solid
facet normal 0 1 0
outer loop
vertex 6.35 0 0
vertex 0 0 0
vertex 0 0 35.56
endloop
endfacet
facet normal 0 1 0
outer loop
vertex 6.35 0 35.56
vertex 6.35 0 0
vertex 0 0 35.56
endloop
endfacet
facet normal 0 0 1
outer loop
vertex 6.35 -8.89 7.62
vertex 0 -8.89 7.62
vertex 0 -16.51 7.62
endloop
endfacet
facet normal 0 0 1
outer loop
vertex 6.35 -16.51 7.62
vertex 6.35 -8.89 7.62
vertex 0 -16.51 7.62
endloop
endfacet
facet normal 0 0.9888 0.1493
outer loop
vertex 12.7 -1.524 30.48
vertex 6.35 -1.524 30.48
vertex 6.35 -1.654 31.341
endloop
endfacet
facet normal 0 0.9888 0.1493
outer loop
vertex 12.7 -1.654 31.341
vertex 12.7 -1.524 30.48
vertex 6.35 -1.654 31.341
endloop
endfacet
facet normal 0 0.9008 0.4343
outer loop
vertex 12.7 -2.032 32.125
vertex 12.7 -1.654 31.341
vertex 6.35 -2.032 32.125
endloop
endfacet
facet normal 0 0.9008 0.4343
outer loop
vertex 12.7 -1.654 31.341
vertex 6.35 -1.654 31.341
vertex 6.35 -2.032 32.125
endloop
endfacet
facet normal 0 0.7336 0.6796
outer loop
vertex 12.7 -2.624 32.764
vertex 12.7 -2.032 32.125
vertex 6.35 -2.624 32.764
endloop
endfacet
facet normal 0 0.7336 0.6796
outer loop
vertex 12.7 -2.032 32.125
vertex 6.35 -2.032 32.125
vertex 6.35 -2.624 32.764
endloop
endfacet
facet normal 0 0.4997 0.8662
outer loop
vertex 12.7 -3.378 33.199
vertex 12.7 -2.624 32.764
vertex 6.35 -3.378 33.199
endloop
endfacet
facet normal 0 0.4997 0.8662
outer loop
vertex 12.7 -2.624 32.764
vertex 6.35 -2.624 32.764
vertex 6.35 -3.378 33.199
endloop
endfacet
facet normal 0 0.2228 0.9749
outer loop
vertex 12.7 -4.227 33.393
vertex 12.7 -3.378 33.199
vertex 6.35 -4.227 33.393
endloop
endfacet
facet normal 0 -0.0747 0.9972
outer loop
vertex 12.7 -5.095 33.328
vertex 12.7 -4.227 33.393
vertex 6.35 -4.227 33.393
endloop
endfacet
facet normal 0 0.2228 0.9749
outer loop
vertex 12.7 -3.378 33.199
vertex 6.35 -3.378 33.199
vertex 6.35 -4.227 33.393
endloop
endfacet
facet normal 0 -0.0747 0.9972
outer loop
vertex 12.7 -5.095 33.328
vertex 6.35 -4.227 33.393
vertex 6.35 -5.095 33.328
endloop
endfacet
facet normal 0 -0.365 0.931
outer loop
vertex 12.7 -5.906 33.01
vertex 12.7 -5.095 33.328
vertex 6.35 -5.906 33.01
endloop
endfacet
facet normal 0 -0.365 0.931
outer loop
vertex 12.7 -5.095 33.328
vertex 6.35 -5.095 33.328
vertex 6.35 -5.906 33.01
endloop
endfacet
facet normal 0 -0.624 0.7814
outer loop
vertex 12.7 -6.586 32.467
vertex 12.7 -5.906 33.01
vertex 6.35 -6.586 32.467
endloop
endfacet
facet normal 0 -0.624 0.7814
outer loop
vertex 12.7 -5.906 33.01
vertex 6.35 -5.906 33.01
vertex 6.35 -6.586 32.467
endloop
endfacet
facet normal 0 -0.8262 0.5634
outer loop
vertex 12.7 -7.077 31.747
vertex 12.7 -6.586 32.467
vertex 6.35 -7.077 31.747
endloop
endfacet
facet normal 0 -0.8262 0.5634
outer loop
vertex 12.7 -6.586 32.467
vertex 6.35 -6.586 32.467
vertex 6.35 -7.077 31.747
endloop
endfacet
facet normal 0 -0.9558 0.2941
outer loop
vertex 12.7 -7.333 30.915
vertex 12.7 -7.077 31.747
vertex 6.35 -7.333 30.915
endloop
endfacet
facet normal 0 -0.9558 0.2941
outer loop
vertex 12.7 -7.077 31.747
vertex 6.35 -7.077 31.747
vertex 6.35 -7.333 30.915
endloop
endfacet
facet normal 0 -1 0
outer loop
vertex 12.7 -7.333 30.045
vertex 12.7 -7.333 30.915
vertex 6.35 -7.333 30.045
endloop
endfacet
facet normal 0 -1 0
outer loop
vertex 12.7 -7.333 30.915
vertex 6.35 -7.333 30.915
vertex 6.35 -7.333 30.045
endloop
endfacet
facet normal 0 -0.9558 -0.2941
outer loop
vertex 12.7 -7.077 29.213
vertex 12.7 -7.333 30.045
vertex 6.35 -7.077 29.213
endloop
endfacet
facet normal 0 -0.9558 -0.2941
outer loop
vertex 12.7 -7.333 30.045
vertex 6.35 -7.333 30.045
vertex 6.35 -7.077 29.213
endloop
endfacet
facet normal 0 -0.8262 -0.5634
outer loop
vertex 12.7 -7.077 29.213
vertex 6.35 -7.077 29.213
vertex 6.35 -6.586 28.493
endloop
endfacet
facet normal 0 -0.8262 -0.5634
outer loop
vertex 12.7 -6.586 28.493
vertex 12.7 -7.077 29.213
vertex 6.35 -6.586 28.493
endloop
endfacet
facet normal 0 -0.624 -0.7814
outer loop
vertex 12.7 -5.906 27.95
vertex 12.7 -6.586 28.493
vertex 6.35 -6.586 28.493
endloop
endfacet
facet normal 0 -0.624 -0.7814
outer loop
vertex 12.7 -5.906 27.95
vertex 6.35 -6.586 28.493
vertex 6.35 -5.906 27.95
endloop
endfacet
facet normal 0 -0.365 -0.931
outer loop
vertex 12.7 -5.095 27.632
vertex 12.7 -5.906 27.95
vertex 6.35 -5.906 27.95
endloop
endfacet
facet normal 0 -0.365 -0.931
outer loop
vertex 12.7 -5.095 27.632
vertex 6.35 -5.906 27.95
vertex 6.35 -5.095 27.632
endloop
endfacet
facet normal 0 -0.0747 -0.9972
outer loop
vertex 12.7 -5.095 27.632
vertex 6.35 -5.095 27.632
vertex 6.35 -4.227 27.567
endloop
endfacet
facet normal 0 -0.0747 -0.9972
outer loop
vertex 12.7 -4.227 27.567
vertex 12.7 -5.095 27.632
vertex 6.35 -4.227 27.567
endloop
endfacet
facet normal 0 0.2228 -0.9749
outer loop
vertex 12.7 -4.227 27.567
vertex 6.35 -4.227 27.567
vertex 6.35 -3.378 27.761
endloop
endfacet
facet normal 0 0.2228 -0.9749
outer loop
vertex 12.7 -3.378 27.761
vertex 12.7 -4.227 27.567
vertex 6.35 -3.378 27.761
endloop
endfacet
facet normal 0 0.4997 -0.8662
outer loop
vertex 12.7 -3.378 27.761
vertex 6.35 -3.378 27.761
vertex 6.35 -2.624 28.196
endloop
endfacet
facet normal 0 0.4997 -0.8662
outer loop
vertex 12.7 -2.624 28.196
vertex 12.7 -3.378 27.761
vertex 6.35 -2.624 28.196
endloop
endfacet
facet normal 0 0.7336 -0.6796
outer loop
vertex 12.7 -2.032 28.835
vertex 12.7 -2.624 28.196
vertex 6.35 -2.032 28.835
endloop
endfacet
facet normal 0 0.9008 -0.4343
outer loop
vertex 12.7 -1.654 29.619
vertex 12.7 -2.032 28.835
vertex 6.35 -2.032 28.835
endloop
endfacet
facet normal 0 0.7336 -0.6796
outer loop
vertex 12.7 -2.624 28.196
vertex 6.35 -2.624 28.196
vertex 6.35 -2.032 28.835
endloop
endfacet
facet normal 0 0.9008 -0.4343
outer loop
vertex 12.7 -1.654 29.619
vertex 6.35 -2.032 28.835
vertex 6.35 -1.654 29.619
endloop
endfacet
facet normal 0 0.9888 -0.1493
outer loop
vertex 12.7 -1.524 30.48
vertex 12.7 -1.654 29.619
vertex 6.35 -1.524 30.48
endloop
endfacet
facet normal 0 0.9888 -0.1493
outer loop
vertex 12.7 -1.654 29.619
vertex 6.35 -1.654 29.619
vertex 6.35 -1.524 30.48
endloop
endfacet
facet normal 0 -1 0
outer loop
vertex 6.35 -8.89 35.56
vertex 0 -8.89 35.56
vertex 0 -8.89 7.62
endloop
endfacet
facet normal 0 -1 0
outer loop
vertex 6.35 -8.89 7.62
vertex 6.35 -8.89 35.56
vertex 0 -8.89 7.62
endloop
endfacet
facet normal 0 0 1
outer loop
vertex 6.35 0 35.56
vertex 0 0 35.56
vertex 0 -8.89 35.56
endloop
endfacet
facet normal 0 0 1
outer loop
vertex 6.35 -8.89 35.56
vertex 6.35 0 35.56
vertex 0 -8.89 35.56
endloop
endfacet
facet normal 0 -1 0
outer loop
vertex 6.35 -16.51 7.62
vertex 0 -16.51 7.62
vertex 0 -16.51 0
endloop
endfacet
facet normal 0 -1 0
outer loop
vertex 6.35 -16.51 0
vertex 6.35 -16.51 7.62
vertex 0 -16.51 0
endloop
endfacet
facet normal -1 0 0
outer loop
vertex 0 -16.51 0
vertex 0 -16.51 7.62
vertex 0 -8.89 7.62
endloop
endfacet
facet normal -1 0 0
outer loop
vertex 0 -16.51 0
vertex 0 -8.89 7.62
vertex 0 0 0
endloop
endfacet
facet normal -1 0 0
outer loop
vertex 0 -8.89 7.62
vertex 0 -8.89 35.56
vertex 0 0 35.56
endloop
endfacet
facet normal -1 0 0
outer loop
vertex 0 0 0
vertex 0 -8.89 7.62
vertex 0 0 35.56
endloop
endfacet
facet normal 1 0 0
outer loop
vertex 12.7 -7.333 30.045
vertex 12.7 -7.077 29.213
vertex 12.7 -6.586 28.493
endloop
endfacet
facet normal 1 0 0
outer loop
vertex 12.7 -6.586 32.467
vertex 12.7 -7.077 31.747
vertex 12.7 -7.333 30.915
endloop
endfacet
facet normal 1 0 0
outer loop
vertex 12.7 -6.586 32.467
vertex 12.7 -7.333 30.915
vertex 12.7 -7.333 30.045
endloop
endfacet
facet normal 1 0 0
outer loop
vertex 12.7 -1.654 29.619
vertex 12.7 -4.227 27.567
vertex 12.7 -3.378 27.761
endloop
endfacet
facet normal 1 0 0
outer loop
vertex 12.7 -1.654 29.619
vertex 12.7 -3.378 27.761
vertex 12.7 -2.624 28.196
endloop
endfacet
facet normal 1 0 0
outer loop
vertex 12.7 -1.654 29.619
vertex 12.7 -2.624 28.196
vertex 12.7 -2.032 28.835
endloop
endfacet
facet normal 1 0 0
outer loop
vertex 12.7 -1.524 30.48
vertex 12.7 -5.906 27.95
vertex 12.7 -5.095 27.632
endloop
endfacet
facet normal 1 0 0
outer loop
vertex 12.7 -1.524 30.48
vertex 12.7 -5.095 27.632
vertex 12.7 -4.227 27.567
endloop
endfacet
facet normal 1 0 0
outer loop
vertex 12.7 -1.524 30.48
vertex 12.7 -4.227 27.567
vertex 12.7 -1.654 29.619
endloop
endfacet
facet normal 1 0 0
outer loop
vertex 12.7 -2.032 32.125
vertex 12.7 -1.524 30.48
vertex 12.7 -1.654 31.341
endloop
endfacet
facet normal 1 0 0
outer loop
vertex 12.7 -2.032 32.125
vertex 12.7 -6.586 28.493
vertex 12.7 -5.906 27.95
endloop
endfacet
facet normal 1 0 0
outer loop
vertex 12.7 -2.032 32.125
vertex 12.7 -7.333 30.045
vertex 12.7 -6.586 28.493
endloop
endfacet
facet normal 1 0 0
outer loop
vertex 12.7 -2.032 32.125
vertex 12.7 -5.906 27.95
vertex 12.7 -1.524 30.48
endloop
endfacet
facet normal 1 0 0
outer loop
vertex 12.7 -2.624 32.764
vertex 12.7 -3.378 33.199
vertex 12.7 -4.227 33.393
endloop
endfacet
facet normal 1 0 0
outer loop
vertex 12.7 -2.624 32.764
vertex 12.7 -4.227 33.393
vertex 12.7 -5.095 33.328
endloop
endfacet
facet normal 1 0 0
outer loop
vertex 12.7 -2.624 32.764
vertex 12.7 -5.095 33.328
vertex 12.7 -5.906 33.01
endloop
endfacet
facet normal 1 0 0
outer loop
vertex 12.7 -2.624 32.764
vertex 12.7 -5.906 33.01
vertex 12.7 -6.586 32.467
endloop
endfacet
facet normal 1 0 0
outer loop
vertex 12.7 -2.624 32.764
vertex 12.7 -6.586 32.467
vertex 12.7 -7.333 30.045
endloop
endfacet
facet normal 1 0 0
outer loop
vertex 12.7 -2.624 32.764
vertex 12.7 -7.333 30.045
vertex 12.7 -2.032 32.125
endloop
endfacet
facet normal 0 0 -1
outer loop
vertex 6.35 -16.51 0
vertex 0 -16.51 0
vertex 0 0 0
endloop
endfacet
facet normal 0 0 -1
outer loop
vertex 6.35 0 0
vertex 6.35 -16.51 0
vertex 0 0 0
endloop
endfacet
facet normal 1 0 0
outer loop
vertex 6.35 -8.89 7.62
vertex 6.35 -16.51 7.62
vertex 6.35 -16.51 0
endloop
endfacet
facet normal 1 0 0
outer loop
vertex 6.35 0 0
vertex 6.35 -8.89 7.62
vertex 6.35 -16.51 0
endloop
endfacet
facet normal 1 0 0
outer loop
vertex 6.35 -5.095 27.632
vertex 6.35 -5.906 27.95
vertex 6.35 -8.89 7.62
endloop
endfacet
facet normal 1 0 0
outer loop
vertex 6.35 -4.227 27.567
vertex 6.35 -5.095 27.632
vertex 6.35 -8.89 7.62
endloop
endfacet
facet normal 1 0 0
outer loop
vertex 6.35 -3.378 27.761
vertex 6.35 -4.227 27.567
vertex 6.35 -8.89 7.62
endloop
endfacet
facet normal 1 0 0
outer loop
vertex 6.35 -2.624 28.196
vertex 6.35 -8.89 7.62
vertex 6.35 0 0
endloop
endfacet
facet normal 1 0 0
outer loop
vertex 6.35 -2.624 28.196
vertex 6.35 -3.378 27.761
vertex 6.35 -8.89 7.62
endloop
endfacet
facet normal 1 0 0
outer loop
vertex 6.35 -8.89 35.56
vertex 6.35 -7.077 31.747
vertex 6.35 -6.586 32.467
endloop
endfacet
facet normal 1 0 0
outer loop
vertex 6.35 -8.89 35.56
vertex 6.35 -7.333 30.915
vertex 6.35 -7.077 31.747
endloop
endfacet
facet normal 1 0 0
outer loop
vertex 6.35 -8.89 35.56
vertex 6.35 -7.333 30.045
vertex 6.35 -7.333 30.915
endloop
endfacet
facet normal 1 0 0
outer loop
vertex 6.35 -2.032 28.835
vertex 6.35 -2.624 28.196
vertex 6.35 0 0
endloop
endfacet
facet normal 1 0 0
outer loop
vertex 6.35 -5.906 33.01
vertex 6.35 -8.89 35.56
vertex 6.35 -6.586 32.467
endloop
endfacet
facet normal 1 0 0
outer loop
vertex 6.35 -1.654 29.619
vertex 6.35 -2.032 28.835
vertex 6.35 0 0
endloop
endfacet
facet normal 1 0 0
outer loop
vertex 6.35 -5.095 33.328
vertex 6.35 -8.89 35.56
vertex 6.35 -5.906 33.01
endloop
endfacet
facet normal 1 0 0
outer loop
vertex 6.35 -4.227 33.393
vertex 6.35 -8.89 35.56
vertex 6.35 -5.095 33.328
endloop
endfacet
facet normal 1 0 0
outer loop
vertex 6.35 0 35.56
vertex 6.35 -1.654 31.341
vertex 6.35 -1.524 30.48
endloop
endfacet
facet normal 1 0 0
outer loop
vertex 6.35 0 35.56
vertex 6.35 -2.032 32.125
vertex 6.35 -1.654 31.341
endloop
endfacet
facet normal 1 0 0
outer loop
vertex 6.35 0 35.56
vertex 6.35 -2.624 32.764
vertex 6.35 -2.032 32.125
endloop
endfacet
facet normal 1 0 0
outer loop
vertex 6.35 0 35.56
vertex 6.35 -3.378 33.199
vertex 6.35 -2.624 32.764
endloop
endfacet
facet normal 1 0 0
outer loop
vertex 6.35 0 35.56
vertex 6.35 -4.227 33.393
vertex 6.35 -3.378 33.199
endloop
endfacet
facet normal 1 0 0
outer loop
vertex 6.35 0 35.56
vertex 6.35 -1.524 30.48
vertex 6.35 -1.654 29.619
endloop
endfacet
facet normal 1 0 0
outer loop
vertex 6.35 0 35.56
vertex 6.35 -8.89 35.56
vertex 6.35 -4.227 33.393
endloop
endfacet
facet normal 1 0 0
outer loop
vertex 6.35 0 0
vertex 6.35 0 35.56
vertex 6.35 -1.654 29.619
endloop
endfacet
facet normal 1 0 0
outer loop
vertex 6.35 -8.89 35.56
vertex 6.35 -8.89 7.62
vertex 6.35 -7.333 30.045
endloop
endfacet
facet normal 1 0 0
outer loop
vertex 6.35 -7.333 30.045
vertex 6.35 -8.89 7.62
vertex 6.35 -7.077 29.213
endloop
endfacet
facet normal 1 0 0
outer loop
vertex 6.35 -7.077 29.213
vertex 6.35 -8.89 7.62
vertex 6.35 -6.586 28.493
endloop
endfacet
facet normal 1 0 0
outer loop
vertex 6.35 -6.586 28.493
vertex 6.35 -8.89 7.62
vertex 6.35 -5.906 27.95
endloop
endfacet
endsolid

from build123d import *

# Parameters (mm, degrees)
F1_DEPTH = 6.35
F2_R     = 2.921
F3_DEPTH = 6.35


with BuildPart() as f1:
    # F0 (on Right) → F1 (new body)
    with BuildSketch(Plane.YZ):
        Polygon((-16.51, 0), (0, 0), (0, 35.56), (-8.89, 35.56), (-8.89, 7.62), (-16.51, 7.62), align=None)
    extrude(amount=F1_DEPTH)

    # F2 (on face) → F3 (join)
    with BuildSketch(Plane.YZ.offset(6.35)):
        with Locations((-4.445, 30.48)):
            Circle(F2_R)
    extrude(amount=F3_DEPTH)


solid = f1.part
